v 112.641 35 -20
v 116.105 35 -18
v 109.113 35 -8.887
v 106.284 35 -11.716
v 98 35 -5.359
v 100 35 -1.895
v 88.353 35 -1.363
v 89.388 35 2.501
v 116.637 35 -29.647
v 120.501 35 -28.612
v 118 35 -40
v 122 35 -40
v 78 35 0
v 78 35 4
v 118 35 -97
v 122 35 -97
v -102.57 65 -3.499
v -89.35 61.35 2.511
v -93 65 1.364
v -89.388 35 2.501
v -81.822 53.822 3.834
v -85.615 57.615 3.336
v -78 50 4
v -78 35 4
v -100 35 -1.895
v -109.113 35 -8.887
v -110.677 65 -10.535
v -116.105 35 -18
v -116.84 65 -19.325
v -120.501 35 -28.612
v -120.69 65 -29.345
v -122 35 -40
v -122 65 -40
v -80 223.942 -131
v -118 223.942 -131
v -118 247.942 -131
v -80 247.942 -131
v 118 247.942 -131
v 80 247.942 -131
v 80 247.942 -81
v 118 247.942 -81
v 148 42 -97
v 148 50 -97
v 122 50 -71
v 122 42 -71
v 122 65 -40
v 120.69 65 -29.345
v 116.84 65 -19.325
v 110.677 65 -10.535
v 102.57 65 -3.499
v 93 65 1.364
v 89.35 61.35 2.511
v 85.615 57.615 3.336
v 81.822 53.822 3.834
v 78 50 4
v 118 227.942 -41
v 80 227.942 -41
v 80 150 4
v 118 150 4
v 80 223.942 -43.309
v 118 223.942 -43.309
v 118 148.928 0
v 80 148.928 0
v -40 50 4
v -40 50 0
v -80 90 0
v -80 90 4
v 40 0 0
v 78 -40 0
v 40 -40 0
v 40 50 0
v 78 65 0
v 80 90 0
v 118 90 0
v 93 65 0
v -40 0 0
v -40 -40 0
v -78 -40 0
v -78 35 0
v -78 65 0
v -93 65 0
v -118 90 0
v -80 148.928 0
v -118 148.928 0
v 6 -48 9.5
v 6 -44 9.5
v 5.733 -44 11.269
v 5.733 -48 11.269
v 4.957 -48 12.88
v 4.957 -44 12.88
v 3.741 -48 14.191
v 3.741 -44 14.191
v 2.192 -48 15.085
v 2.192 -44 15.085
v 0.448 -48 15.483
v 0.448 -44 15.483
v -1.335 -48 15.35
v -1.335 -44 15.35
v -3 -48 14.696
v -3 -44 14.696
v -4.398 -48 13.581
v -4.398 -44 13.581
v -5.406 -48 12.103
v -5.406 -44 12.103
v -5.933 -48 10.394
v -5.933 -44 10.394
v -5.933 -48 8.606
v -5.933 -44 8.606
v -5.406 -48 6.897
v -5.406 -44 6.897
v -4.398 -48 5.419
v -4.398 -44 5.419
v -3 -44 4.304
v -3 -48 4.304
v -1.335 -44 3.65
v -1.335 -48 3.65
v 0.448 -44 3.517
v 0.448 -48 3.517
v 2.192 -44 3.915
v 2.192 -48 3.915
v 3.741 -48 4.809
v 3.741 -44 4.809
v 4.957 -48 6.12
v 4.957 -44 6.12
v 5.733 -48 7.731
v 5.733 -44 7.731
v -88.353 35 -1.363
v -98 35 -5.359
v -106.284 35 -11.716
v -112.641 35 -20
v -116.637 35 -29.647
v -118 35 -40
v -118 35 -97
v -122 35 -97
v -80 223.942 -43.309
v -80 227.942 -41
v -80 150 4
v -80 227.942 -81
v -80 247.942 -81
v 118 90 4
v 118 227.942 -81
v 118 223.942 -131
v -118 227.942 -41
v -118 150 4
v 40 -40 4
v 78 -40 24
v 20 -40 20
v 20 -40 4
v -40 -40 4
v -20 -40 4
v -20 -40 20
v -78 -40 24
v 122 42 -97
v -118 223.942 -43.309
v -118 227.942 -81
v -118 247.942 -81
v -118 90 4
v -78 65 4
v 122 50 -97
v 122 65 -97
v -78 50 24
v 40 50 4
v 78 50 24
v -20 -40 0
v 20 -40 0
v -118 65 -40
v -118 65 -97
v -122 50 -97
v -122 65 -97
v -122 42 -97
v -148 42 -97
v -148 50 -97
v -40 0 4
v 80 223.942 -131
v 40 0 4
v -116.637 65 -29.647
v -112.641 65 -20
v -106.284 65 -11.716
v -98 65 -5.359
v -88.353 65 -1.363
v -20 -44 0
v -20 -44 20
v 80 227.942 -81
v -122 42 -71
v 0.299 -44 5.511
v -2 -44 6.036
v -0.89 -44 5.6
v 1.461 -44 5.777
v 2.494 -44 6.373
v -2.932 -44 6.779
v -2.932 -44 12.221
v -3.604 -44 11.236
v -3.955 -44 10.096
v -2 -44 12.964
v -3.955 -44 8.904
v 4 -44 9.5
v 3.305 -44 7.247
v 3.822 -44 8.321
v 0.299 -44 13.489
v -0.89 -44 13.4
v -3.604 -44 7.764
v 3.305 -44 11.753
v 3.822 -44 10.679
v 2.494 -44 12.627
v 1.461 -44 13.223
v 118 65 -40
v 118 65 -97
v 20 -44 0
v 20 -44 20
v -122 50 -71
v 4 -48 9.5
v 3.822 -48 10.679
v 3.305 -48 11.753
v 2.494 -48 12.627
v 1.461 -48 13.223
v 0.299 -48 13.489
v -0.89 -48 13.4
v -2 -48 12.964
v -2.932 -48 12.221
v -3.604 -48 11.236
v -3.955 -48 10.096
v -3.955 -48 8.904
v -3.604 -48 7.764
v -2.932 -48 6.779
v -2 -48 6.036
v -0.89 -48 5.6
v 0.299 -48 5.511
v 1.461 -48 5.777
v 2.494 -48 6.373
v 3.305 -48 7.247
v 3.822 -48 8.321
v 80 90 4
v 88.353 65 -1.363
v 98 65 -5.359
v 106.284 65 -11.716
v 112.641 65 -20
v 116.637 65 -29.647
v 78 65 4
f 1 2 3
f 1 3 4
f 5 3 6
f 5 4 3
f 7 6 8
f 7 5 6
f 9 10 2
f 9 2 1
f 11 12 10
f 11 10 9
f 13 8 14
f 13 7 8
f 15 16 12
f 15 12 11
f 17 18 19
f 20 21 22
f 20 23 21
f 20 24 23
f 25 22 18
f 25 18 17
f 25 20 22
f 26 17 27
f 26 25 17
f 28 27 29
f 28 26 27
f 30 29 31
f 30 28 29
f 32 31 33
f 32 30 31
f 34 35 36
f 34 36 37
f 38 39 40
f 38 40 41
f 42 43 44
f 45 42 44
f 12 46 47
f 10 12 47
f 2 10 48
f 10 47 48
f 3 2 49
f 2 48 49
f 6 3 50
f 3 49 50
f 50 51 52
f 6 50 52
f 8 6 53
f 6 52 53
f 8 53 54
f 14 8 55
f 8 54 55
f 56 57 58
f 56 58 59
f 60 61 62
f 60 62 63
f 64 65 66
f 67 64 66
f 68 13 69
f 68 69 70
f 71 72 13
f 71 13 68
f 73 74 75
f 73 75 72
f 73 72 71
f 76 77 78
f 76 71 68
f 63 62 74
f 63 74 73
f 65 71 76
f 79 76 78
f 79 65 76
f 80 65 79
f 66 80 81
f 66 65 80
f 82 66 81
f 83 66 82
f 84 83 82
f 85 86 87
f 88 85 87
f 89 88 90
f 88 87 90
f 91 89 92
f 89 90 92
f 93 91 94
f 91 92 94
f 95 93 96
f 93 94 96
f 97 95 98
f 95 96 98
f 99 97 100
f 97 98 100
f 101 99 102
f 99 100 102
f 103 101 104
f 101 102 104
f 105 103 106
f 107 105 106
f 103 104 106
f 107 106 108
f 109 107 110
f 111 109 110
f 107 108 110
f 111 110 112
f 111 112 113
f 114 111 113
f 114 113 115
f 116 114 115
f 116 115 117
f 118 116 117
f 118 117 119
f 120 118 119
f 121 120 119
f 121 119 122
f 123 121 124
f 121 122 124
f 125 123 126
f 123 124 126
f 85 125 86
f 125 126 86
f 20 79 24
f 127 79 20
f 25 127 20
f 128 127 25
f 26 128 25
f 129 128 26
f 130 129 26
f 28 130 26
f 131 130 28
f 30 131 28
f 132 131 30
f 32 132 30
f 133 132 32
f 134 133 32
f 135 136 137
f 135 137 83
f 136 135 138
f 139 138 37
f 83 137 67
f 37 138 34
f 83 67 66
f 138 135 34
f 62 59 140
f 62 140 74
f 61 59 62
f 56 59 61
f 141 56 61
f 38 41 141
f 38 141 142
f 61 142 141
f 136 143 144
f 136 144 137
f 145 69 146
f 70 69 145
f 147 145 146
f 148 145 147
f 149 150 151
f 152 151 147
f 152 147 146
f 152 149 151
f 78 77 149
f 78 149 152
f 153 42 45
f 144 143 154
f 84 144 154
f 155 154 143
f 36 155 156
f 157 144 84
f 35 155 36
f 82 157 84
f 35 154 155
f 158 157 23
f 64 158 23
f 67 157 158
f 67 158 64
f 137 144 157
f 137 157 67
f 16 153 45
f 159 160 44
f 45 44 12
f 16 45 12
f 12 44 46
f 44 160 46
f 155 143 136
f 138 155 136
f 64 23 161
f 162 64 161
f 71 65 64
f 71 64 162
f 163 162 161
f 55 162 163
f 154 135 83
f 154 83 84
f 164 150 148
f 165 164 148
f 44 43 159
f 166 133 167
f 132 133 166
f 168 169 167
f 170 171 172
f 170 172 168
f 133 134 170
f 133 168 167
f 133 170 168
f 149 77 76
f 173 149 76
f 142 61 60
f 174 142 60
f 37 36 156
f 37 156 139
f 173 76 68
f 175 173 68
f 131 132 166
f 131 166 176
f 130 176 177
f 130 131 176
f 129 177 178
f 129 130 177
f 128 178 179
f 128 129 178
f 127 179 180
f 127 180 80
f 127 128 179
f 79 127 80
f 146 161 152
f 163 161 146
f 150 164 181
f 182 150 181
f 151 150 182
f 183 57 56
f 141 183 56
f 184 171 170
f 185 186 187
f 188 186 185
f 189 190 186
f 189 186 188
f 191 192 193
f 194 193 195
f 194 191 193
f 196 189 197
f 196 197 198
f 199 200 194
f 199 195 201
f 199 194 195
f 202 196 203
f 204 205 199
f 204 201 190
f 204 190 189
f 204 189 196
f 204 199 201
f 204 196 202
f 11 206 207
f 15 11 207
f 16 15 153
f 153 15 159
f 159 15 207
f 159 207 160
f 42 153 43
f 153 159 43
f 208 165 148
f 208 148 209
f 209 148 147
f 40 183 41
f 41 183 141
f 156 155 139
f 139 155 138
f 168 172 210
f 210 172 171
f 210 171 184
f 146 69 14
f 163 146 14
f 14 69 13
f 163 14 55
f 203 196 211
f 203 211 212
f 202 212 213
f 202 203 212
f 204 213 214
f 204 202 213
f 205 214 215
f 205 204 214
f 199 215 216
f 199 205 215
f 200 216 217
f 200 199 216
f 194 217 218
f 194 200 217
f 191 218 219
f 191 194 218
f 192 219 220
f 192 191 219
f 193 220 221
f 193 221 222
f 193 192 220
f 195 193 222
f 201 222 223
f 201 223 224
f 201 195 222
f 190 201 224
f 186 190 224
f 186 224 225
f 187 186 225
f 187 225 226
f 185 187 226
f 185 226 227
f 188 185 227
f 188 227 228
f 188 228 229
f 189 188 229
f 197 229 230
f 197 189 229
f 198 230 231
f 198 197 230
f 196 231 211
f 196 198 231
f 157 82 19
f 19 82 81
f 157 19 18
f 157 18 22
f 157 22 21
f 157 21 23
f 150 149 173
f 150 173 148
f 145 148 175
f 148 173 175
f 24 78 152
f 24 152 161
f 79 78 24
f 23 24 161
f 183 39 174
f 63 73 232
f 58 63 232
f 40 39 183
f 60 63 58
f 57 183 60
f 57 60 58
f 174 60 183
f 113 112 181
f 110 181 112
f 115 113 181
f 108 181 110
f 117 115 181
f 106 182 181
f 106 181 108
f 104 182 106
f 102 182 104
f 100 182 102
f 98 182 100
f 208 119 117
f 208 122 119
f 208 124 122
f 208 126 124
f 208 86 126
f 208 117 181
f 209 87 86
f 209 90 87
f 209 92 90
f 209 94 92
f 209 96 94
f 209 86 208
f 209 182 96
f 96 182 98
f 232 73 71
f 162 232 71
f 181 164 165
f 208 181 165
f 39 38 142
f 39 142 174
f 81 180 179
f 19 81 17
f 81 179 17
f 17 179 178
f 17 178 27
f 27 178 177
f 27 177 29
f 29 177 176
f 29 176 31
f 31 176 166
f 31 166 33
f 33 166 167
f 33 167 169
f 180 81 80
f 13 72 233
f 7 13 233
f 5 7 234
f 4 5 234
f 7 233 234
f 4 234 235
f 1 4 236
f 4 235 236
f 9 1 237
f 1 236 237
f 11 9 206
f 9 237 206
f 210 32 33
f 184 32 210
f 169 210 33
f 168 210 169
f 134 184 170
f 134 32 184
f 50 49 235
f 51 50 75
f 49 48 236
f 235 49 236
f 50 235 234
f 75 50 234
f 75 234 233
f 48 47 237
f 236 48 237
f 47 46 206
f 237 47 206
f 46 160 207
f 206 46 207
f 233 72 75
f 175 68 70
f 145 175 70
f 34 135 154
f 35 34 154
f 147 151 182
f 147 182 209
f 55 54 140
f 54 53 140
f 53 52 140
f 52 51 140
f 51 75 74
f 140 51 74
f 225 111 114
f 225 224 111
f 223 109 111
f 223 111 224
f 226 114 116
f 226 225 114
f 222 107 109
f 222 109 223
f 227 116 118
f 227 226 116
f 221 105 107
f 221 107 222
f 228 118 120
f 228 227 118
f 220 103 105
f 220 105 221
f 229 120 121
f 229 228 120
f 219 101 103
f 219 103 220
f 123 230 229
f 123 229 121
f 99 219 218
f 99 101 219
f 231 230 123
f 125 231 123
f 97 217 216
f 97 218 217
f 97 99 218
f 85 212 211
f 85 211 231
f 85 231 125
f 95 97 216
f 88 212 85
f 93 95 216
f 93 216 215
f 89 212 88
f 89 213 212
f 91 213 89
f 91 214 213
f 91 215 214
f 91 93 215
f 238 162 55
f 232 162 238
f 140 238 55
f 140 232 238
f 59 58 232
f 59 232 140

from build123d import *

# Parameters (mm, degrees)
EXTRUDE_1_DEPTH     = 4
SKETCH_11_W         = 156
SKETCH_11_H         = 90
EXTRUDE_2_DEPTH     = 20
SKETCH_12_W         = 38
SKETCH_12_H         = 4
SKETCH_14_W         = 38
SKETCH_14_H         = 50
EXTRUDE_3_DEPTH     = 20
SKETCH_16_W         = 238.183586275
SKETCH_16_H         = 132.295328182
CUT_EXTRUDE_1_DEPTH = 10
SKETCH_17_W         = 40
SKETCH_17_H         = 20
EXTRUDE_4_DEPTH     = 4
SKETCH_21_R         = 6
SKETCH_21_R_2       = 4
EXTRUDE_8_DEPTH     = 4
EXTRUDE_11_DEPTH    = 15
EXTRUDE_12_DEPTH    = 8


with BuildPart() as part:
    # 草图1 → 凸台-拉伸1 (new body)
    with BuildSketch(Plane.XY):
        Polygon((-40, 0), (40, 0), (40, -160), (78, -160), (78, 0), (78, 50), (118, 90), (80, 90), (40, 50), (-40, 50), (-80, 90), (-118, 90), (-78, 50), (-78, 0), (-78, -160), (-40, -160), align=None)
    extrude(amount=EXTRUDE_1_DEPTH)

    # 草图11 → 凸台-拉伸2 (add)
    with BuildSketch(Plane.XY.offset(4)):
        with Locations((0, 5)):
            Rectangle(SKETCH_11_W, SKETCH_11_H)
    extrude(amount=EXTRUDE_2_DEPTH)

    # 扫描1: sweep along a path in 草图13
    with BuildLine(Plane(origin=(78, 0, 0), x_dir=(0, 0, -1), z_dir=(1, 0, 0))) as sweep_1_path:
        Line((-4, 90), (-4, 150))
        Line((-4, 150), (41, 227.942286341))
        Line((41, 227.942286341), (131, 227.942286341))
    # 草图12 → 扫描1 (sweep)
    with BuildSketch(Plane(origin=(0, 90, 0), x_dir=(1, 0, 0), z_dir=(0, 1, 0))):
        with Locations((-99, -2)):
            Rectangle(SKETCH_12_W, SKETCH_12_H)
        with Locations((99, -2)):
            Rectangle(SKETCH_12_W, SKETCH_12_H)
    sweep(path=sweep_1_path.line, transition=Transition.RIGHT)

    # 草图14 → 凸台-拉伸3 (add)
    with BuildSketch(Plane(origin=(0, 227.942286341, 0), x_dir=(1, 0, 0), z_dir=(0, 1, 0))):
        with Locations((-99, 106)):
            Rectangle(SKETCH_14_W, SKETCH_14_H)
        with Locations((99, 106)):
            Rectangle(SKETCH_14_W, SKETCH_14_H)
    extrude(amount=EXTRUDE_3_DEPTH)

    # 草图16 → 切除-拉伸1 (cut)
    with BuildSketch(Plane(origin=(0, 0, 0), x_dir=(-1, 0, 0), z_dir=(0, 0, -1))):
        with Locations((8.714033644, -106.147664091)):
            Rectangle(SKETCH_16_W, SKETCH_16_H)
    extrude(amount=-CUT_EXTRUDE_1_DEPTH, mode=Mode.SUBTRACT)

    # 草图17 → 凸台-拉伸4 (add)
    with BuildSketch(Plane.XZ.offset(40)):
        with Locations((0, 10)):
            Rectangle(SKETCH_17_W, SKETCH_17_H)
    extrude(amount=EXTRUDE_4_DEPTH)

    # 草图21 → 凸台-拉伸8 (add)
    with BuildSketch(Plane.XZ.offset(44)):
        with Locations((0, 9.5)):
            Circle(SKETCH_21_R)
        with Locations((0, 9.5)):
            Circle(SKETCH_21_R_2, mode=Mode.SUBTRACT)
    extrude(amount=EXTRUDE_8_DEPTH)

    # 草图28 → 凸台-拉伸11 (add, symmetric)
    with BuildSketch(Plane(origin=(0, 50, 0), x_dir=(1, 0, 0), z_dir=(0, 1, 0))):
        with BuildLine():
            Line((-122, 40), (-122, 97))
            Line((-122, 97), (-118, 97))
            Line((-118, 97), (-118, 40))
            ThreePointArc((-118, 40), (-106.284271247, 11.715728753), (-78, 0))
            Line((-78, 0), (-78, -4))
            ThreePointArc((-78, -4), (-109.112698372, 8.887301628), (-122, 40))
        make_face()
        with BuildLine():
            Line((118, 40), (118, 97))
            Line((118, 97), (122, 97))
            Line((122, 97), (122, 40))
            ThreePointArc((122, 40), (109.112698372, 8.887301628), (78, -4))
            Line((78, -4), (78, 0))
            ThreePointArc((78, 0), (106.284271247, 11.715728753), (118, 40))
        make_face()
    extrude(amount=EXTRUDE_11_DEPTH, both=True)

    # 草图29 → 凸台-拉伸12 (add)
    with BuildSketch(Plane(origin=(0, 50, 0), x_dir=(1, 0, 0), z_dir=(0, 1, 0))):
        Polygon((122, 97), (148, 97), (122, 71), align=None)
        Polygon((-122, 97), (-148, 97), (-122, 71), align=None)
    extrude(amount=-EXTRUDE_12_DEPTH)


solid = part.part
